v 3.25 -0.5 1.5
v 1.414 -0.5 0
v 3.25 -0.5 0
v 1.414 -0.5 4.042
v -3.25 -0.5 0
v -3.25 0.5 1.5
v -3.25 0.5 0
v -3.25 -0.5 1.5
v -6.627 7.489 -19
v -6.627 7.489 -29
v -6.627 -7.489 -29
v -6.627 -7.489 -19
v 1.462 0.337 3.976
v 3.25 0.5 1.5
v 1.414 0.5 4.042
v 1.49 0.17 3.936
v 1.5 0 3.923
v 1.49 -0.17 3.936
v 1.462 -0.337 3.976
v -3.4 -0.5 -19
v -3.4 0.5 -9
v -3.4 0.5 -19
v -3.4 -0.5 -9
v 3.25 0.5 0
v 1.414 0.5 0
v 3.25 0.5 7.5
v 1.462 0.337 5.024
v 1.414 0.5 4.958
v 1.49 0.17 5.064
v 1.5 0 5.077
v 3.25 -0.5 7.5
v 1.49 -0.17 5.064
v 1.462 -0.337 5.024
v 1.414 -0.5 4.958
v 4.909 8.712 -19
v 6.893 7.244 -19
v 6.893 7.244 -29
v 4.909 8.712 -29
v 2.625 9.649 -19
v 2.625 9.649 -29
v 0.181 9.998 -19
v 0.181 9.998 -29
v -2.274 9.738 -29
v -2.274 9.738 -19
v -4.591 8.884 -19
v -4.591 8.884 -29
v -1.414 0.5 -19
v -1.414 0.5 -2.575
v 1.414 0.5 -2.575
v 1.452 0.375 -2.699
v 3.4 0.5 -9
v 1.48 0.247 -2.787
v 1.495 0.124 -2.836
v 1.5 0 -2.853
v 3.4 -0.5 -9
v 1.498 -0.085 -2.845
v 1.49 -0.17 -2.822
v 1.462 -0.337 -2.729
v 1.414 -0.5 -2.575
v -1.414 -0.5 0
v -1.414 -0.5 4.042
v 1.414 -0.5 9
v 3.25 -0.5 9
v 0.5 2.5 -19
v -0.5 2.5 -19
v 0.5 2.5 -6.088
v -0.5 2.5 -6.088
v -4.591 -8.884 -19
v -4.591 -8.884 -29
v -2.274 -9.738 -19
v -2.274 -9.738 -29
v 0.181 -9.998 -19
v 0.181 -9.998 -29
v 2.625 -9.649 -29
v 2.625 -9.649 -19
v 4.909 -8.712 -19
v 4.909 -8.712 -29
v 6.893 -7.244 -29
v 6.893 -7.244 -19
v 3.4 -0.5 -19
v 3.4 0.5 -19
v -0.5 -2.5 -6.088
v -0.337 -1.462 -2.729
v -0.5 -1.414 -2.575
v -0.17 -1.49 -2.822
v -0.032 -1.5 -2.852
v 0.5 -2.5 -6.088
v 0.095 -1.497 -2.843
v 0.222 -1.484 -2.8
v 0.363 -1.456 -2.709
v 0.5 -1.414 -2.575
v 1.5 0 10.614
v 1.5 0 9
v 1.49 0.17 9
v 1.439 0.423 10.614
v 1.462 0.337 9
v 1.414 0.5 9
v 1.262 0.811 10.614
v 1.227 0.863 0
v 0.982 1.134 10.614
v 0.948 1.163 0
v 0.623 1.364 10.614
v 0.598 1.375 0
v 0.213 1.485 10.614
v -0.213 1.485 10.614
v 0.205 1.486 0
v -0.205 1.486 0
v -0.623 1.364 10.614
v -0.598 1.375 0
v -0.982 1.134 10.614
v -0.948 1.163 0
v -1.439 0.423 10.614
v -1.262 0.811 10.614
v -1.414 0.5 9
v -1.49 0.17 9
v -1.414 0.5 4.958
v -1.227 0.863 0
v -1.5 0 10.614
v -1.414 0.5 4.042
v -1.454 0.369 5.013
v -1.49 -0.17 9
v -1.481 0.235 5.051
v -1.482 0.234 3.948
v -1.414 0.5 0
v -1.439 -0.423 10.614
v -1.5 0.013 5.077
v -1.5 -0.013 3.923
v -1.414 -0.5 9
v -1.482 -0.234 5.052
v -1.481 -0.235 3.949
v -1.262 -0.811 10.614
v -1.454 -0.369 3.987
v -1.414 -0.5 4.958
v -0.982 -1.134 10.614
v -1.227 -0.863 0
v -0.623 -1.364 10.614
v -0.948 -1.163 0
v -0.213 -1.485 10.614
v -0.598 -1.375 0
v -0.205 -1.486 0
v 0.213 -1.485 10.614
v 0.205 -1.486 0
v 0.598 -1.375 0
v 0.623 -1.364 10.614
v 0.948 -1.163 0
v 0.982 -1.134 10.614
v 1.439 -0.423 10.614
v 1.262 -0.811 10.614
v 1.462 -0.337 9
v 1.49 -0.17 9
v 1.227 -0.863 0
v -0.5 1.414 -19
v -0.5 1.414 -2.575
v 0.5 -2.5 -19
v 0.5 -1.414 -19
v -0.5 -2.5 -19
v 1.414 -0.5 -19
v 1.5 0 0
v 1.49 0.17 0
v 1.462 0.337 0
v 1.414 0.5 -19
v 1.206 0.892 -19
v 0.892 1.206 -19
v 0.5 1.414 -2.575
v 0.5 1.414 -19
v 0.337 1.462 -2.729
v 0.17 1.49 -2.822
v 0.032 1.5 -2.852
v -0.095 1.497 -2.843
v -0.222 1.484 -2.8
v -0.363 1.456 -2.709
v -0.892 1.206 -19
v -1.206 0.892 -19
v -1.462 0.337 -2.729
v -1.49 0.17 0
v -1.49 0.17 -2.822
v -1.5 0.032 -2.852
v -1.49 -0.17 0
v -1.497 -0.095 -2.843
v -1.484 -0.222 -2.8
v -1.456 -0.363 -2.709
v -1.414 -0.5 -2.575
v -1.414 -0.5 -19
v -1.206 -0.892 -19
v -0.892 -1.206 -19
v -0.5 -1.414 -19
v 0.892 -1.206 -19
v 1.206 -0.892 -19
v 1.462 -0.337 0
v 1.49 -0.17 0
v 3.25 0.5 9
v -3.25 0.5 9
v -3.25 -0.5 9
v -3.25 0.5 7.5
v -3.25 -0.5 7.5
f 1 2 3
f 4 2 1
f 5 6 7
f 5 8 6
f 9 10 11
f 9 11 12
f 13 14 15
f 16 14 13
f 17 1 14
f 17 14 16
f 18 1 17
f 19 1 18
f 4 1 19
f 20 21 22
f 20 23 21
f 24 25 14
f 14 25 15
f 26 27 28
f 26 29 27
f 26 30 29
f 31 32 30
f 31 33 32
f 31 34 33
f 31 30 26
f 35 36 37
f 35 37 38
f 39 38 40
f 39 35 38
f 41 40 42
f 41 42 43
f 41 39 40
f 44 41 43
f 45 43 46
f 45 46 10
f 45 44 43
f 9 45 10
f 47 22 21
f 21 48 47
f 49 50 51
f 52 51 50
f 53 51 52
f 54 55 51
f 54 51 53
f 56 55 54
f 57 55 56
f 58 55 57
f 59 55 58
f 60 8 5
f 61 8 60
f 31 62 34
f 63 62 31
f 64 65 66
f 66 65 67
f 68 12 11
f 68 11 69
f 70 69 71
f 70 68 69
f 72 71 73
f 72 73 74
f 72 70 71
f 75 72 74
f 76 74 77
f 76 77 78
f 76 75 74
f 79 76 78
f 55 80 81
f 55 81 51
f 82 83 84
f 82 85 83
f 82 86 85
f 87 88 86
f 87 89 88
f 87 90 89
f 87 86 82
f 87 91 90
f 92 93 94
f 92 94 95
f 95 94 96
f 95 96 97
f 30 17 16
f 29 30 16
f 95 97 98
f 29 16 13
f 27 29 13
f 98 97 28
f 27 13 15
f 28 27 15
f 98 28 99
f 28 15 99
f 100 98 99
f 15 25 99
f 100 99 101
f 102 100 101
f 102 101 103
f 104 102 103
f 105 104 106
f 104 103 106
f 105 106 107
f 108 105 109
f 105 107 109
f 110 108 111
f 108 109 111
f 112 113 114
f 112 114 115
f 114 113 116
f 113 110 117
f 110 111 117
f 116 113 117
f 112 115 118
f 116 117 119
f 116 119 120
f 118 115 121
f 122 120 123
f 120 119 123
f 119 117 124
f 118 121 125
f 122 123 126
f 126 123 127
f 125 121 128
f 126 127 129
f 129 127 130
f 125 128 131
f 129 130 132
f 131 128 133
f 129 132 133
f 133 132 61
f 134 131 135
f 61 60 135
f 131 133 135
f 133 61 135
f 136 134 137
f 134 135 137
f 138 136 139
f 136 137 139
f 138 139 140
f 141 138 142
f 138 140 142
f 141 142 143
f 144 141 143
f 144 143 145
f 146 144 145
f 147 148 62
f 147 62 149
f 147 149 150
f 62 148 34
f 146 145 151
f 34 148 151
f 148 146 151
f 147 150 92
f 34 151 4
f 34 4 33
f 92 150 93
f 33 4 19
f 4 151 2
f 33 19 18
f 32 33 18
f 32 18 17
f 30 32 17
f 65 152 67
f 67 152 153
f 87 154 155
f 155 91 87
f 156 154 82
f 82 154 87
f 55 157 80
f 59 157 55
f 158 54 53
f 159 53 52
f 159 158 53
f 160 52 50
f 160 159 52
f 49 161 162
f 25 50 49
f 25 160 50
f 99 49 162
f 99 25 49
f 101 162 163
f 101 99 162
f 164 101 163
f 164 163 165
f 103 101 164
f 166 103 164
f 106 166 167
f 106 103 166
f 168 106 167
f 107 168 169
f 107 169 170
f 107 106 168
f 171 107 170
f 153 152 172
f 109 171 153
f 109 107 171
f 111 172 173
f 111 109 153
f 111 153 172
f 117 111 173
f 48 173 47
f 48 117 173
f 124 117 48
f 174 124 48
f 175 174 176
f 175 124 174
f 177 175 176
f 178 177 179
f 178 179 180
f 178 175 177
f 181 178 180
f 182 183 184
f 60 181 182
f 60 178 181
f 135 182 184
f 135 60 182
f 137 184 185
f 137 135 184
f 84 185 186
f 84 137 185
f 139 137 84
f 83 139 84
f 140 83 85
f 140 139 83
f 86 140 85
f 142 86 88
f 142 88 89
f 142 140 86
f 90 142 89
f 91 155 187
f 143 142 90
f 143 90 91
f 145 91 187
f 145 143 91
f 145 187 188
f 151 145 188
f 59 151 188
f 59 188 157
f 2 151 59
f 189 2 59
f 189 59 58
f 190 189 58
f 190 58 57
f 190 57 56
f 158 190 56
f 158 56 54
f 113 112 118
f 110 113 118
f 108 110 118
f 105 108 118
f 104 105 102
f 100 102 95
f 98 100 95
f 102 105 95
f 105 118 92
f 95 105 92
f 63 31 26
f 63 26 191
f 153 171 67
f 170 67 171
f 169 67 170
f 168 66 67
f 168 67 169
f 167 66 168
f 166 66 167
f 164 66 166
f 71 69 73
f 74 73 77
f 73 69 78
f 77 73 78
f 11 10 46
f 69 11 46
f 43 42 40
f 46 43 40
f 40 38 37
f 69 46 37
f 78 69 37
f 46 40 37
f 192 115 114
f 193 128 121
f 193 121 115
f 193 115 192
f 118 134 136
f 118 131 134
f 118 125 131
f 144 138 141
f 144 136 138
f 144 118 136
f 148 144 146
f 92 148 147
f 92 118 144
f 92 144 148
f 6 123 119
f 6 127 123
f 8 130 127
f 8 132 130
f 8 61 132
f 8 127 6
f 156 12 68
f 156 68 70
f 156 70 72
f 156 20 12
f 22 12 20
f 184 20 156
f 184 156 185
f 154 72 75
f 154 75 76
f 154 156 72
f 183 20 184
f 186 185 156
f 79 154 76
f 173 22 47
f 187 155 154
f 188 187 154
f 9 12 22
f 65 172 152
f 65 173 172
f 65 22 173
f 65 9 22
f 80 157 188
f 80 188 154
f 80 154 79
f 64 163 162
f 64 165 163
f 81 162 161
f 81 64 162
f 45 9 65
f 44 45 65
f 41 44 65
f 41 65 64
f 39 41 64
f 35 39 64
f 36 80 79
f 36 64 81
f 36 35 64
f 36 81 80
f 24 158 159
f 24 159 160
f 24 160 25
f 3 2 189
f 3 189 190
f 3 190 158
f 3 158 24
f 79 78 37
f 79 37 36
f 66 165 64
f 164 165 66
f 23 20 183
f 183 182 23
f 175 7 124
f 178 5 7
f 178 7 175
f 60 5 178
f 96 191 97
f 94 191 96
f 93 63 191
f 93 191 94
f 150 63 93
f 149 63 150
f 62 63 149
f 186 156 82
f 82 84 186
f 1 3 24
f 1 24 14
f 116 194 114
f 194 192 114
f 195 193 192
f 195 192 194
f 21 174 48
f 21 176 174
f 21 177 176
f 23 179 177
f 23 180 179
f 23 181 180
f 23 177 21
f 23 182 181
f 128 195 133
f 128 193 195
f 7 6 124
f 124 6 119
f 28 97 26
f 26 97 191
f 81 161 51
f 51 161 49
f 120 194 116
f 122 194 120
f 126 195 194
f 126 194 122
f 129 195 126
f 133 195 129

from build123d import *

# Parameters (mm, degrees)
SKETCH_R             = 1.5
PAD_DEPTH            = 35
PAD001_DEPTH         = 0.5
SKETCH002_R          = 1.5
PAD002_DEPTH         = 19
PAD003_DEPTH         = 0.5
POLARPATTERN_COUNT   = 2
POLARPATTERN_ANGLE   = 90
SKETCH004_R          = 10
PAD004_DEPTH         = 10
SKETCH006_W          = 5.388718
SKETCH006_H          = 19
SKETCH006_W_2        = 5.907516
POCKET_DEPTH         = 5
SKETCH005_W          = 53.248554
SKETCH005_H          = 72.779518
SKETCH005_W_2        = 13.520593
SKETCH005_H_2        = 41.716759
POCKET001_DEPTH      = 10.001
POCKET001_DEPTH_BACK = -10.001


with BuildPart() as part:
    # Sketch → Pad (new body)
    with BuildSketch(Plane.XY):
        Circle(SKETCH_R)
    extrude(amount=PAD_DEPTH)

    # Sketch001 → Pad001 (join, symmetric)
    with BuildSketch(Plane.XZ):
        Polygon((-3.25, 0), (3.25, 0), (3.25, 1.5), (1.083333, 4.5), (3.25, 7.5), (3.25, 9), (-3.25, 9), (-3.25, 7.5), (-1.083333, 4.5), (-3.25, 1.5), align=None)
    extrude(amount=PAD001_DEPTH, both=True)

    # Sketch002 → Pad002 (join)
    with BuildSketch(Plane.XY):
        Circle(SKETCH002_R)
    extrude(amount=-PAD002_DEPTH)

    # Sketch003 → Pad003 (join, symmetric)
    with BuildSketch(Plane.XZ):
        Polygon((-3.4, -19), (3.4, -19), (3.4, -9), (0, 2), (-3.4, -9), align=None)
    pad003 = extrude(amount=PAD003_DEPTH, both=True)

    # PolarPattern: Pad003 ×2 about axis
    polarpattern_axis = Axis((0, 0, 0), (0, 0, 1))
    for i in range(1, POLARPATTERN_COUNT):
        add(pad003.rotate(polarpattern_axis, i * POLARPATTERN_ANGLE / (POLARPATTERN_COUNT - 1)))

    # Sketch004 → Pad004 (join)
    with BuildSketch(Plane.XY.offset(-19)):
        Circle(SKETCH004_R)
    extrude(amount=-PAD004_DEPTH)

    # Sketch006 → Pocket (cut, symmetric)
    with BuildSketch(Plane.YZ):
        with Locations((5.194359, -9.5)):
            Rectangle(SKETCH006_W, SKETCH006_H)
        with Locations((-5.453758, -9.5)):
            Rectangle(SKETCH006_W_2, SKETCH006_H)
    extrude(amount=POCKET_DEPTH, both=True, mode=Mode.SUBTRACT)

    # Sketch005 → Pocket001 (cut, two sides)
    with BuildSketch(Plane.XZ) as pocket001_sk:
        with Locations((-0.717024, -0.672455)):
            Rectangle(SKETCH005_W, SKETCH005_H)
        with Locations((0.133193, -10.244297)):
            Rectangle(SKETCH005_W_2, SKETCH005_H_2, mode=Mode.SUBTRACT)
    extrude(amount=-POCKET001_DEPTH, mode=Mode.SUBTRACT)
    extrude(pocket001_sk.sketch, amount=-POCKET001_DEPTH_BACK, mode=Mode.SUBTRACT)


solid = part.part
